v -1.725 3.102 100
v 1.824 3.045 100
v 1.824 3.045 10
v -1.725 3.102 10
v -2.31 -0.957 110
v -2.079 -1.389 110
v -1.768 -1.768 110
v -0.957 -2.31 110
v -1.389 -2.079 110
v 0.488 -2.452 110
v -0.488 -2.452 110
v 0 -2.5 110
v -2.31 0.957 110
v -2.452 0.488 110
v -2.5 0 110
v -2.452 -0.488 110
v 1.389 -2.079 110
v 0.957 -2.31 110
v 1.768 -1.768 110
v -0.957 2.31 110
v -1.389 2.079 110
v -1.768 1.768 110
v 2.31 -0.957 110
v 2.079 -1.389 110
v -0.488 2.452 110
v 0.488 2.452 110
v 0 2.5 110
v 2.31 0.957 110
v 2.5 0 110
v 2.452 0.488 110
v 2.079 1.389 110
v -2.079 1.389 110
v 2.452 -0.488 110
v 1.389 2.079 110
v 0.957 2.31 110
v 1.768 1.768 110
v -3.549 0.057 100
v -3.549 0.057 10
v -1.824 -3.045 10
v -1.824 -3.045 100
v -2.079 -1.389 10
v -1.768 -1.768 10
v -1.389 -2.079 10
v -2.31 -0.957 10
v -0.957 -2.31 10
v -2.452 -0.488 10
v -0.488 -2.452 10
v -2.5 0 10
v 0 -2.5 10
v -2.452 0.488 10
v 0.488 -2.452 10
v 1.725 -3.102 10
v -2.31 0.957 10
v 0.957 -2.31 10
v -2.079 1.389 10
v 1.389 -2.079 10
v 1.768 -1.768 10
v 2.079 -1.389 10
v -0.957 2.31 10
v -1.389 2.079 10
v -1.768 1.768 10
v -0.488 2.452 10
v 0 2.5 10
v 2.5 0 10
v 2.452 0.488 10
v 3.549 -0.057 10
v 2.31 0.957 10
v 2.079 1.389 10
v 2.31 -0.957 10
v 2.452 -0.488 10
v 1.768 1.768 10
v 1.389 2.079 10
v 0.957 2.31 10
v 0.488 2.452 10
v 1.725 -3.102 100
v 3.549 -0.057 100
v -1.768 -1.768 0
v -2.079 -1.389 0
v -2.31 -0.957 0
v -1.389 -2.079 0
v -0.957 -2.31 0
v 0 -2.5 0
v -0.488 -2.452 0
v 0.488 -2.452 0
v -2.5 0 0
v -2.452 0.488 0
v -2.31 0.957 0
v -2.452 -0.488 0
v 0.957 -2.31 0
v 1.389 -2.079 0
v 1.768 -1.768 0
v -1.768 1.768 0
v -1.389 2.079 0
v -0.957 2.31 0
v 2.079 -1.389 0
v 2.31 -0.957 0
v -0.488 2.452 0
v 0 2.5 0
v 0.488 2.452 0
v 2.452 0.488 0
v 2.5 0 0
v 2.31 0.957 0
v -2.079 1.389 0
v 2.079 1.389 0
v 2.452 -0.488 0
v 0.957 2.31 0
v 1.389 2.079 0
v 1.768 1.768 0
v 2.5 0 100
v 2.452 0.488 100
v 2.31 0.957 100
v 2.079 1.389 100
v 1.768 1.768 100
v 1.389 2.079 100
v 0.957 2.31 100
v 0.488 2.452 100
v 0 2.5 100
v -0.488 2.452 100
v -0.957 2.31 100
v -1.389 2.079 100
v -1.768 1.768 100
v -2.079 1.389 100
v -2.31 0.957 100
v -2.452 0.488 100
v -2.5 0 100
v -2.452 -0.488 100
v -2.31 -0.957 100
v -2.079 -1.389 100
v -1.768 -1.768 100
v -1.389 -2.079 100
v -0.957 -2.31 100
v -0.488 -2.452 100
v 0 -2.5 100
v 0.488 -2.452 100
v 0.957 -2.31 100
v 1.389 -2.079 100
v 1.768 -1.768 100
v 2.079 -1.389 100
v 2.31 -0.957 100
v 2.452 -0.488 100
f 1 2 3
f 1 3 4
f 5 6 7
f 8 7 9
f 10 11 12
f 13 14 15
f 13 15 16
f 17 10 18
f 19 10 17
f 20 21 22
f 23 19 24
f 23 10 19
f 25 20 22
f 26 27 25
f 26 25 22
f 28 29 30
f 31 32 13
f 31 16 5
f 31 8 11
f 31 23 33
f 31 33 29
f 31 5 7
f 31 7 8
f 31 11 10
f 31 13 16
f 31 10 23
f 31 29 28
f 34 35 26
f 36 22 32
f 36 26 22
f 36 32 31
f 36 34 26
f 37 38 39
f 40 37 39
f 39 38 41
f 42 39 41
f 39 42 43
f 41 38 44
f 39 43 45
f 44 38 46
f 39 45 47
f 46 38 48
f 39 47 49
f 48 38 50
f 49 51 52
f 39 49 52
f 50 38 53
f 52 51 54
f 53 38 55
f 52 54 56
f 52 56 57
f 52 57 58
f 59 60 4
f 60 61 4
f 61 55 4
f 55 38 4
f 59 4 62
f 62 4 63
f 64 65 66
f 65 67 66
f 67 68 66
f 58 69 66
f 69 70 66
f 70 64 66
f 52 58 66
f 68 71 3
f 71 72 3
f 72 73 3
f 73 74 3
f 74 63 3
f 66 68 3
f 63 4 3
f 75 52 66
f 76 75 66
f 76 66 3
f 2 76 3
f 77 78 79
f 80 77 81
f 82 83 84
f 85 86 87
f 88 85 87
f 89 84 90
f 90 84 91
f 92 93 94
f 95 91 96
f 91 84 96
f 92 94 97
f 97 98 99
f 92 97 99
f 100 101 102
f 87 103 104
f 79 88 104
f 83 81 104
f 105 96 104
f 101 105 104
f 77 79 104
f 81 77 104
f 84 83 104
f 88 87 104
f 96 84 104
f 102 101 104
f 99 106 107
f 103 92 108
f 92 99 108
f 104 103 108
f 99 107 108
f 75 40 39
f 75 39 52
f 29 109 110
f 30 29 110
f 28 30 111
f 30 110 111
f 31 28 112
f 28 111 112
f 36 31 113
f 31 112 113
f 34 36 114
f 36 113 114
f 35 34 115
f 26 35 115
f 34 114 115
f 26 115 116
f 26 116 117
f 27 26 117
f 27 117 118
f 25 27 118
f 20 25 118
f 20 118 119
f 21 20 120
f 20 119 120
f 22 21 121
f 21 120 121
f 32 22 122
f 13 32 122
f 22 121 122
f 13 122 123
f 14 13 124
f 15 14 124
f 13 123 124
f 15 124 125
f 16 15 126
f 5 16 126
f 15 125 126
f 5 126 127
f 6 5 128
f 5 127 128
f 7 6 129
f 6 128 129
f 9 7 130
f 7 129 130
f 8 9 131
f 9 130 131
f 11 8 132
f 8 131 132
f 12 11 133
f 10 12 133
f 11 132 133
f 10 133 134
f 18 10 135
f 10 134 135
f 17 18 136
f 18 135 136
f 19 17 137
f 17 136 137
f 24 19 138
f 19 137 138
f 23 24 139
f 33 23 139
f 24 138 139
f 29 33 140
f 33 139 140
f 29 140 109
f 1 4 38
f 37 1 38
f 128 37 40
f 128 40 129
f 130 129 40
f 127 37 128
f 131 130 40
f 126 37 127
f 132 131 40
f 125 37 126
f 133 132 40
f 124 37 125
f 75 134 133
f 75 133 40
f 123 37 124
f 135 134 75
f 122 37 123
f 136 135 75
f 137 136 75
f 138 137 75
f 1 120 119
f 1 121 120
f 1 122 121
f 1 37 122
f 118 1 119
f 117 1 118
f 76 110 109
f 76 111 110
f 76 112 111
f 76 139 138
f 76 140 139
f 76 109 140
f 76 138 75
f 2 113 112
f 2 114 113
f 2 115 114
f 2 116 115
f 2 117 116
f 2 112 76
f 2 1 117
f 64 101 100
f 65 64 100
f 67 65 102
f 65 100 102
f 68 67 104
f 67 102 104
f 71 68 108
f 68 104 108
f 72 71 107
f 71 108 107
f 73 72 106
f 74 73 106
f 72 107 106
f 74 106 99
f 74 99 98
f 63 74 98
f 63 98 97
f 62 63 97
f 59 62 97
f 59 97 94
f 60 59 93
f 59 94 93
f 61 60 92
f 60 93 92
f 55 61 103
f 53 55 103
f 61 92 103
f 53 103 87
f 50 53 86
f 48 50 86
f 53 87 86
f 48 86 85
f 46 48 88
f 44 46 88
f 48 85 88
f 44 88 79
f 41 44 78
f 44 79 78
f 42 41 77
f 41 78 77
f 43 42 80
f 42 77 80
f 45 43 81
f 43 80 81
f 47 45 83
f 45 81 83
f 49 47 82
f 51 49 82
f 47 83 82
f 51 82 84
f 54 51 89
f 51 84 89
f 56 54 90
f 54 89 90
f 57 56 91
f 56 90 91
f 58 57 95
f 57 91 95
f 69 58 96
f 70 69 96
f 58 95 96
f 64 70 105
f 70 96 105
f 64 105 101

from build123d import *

# Parameters (mm, degrees)
SKETCH_1_R      = 2.5
EXTRUDE_1_DEPTH = 10
EXTRUDE_2_DEPTH = 90
SKETCH_3_R      = 2.5
EXTRUDE_3_DEPTH = 10


with BuildPart() as part:
    # 草图1 → 凸台-拉伸1 (new body)
    with BuildSketch(Plane.XY):
        Circle(SKETCH_1_R)
    extrude(amount=EXTRUDE_1_DEPTH)

    # 草图2 → 凸台-拉伸2 (add)
    with BuildSketch(Plane.XY.offset(10)):
        Polygon((3.549191068, -0.056914546), (1.823884976, 3.045232355), (-1.725306092, 3.1021469), (-3.549191068, 0.056914546), (-1.823884976, -3.045232355), (1.725306092, -3.1021469), align=None)
    extrude(amount=EXTRUDE_2_DEPTH)

    # 草图3 → 凸台-拉伸3 (add)
    with BuildSketch(Plane.XY.offset(100)):
        Circle(SKETCH_3_R)
    extrude(amount=EXTRUDE_3_DEPTH)


solid = part.part
